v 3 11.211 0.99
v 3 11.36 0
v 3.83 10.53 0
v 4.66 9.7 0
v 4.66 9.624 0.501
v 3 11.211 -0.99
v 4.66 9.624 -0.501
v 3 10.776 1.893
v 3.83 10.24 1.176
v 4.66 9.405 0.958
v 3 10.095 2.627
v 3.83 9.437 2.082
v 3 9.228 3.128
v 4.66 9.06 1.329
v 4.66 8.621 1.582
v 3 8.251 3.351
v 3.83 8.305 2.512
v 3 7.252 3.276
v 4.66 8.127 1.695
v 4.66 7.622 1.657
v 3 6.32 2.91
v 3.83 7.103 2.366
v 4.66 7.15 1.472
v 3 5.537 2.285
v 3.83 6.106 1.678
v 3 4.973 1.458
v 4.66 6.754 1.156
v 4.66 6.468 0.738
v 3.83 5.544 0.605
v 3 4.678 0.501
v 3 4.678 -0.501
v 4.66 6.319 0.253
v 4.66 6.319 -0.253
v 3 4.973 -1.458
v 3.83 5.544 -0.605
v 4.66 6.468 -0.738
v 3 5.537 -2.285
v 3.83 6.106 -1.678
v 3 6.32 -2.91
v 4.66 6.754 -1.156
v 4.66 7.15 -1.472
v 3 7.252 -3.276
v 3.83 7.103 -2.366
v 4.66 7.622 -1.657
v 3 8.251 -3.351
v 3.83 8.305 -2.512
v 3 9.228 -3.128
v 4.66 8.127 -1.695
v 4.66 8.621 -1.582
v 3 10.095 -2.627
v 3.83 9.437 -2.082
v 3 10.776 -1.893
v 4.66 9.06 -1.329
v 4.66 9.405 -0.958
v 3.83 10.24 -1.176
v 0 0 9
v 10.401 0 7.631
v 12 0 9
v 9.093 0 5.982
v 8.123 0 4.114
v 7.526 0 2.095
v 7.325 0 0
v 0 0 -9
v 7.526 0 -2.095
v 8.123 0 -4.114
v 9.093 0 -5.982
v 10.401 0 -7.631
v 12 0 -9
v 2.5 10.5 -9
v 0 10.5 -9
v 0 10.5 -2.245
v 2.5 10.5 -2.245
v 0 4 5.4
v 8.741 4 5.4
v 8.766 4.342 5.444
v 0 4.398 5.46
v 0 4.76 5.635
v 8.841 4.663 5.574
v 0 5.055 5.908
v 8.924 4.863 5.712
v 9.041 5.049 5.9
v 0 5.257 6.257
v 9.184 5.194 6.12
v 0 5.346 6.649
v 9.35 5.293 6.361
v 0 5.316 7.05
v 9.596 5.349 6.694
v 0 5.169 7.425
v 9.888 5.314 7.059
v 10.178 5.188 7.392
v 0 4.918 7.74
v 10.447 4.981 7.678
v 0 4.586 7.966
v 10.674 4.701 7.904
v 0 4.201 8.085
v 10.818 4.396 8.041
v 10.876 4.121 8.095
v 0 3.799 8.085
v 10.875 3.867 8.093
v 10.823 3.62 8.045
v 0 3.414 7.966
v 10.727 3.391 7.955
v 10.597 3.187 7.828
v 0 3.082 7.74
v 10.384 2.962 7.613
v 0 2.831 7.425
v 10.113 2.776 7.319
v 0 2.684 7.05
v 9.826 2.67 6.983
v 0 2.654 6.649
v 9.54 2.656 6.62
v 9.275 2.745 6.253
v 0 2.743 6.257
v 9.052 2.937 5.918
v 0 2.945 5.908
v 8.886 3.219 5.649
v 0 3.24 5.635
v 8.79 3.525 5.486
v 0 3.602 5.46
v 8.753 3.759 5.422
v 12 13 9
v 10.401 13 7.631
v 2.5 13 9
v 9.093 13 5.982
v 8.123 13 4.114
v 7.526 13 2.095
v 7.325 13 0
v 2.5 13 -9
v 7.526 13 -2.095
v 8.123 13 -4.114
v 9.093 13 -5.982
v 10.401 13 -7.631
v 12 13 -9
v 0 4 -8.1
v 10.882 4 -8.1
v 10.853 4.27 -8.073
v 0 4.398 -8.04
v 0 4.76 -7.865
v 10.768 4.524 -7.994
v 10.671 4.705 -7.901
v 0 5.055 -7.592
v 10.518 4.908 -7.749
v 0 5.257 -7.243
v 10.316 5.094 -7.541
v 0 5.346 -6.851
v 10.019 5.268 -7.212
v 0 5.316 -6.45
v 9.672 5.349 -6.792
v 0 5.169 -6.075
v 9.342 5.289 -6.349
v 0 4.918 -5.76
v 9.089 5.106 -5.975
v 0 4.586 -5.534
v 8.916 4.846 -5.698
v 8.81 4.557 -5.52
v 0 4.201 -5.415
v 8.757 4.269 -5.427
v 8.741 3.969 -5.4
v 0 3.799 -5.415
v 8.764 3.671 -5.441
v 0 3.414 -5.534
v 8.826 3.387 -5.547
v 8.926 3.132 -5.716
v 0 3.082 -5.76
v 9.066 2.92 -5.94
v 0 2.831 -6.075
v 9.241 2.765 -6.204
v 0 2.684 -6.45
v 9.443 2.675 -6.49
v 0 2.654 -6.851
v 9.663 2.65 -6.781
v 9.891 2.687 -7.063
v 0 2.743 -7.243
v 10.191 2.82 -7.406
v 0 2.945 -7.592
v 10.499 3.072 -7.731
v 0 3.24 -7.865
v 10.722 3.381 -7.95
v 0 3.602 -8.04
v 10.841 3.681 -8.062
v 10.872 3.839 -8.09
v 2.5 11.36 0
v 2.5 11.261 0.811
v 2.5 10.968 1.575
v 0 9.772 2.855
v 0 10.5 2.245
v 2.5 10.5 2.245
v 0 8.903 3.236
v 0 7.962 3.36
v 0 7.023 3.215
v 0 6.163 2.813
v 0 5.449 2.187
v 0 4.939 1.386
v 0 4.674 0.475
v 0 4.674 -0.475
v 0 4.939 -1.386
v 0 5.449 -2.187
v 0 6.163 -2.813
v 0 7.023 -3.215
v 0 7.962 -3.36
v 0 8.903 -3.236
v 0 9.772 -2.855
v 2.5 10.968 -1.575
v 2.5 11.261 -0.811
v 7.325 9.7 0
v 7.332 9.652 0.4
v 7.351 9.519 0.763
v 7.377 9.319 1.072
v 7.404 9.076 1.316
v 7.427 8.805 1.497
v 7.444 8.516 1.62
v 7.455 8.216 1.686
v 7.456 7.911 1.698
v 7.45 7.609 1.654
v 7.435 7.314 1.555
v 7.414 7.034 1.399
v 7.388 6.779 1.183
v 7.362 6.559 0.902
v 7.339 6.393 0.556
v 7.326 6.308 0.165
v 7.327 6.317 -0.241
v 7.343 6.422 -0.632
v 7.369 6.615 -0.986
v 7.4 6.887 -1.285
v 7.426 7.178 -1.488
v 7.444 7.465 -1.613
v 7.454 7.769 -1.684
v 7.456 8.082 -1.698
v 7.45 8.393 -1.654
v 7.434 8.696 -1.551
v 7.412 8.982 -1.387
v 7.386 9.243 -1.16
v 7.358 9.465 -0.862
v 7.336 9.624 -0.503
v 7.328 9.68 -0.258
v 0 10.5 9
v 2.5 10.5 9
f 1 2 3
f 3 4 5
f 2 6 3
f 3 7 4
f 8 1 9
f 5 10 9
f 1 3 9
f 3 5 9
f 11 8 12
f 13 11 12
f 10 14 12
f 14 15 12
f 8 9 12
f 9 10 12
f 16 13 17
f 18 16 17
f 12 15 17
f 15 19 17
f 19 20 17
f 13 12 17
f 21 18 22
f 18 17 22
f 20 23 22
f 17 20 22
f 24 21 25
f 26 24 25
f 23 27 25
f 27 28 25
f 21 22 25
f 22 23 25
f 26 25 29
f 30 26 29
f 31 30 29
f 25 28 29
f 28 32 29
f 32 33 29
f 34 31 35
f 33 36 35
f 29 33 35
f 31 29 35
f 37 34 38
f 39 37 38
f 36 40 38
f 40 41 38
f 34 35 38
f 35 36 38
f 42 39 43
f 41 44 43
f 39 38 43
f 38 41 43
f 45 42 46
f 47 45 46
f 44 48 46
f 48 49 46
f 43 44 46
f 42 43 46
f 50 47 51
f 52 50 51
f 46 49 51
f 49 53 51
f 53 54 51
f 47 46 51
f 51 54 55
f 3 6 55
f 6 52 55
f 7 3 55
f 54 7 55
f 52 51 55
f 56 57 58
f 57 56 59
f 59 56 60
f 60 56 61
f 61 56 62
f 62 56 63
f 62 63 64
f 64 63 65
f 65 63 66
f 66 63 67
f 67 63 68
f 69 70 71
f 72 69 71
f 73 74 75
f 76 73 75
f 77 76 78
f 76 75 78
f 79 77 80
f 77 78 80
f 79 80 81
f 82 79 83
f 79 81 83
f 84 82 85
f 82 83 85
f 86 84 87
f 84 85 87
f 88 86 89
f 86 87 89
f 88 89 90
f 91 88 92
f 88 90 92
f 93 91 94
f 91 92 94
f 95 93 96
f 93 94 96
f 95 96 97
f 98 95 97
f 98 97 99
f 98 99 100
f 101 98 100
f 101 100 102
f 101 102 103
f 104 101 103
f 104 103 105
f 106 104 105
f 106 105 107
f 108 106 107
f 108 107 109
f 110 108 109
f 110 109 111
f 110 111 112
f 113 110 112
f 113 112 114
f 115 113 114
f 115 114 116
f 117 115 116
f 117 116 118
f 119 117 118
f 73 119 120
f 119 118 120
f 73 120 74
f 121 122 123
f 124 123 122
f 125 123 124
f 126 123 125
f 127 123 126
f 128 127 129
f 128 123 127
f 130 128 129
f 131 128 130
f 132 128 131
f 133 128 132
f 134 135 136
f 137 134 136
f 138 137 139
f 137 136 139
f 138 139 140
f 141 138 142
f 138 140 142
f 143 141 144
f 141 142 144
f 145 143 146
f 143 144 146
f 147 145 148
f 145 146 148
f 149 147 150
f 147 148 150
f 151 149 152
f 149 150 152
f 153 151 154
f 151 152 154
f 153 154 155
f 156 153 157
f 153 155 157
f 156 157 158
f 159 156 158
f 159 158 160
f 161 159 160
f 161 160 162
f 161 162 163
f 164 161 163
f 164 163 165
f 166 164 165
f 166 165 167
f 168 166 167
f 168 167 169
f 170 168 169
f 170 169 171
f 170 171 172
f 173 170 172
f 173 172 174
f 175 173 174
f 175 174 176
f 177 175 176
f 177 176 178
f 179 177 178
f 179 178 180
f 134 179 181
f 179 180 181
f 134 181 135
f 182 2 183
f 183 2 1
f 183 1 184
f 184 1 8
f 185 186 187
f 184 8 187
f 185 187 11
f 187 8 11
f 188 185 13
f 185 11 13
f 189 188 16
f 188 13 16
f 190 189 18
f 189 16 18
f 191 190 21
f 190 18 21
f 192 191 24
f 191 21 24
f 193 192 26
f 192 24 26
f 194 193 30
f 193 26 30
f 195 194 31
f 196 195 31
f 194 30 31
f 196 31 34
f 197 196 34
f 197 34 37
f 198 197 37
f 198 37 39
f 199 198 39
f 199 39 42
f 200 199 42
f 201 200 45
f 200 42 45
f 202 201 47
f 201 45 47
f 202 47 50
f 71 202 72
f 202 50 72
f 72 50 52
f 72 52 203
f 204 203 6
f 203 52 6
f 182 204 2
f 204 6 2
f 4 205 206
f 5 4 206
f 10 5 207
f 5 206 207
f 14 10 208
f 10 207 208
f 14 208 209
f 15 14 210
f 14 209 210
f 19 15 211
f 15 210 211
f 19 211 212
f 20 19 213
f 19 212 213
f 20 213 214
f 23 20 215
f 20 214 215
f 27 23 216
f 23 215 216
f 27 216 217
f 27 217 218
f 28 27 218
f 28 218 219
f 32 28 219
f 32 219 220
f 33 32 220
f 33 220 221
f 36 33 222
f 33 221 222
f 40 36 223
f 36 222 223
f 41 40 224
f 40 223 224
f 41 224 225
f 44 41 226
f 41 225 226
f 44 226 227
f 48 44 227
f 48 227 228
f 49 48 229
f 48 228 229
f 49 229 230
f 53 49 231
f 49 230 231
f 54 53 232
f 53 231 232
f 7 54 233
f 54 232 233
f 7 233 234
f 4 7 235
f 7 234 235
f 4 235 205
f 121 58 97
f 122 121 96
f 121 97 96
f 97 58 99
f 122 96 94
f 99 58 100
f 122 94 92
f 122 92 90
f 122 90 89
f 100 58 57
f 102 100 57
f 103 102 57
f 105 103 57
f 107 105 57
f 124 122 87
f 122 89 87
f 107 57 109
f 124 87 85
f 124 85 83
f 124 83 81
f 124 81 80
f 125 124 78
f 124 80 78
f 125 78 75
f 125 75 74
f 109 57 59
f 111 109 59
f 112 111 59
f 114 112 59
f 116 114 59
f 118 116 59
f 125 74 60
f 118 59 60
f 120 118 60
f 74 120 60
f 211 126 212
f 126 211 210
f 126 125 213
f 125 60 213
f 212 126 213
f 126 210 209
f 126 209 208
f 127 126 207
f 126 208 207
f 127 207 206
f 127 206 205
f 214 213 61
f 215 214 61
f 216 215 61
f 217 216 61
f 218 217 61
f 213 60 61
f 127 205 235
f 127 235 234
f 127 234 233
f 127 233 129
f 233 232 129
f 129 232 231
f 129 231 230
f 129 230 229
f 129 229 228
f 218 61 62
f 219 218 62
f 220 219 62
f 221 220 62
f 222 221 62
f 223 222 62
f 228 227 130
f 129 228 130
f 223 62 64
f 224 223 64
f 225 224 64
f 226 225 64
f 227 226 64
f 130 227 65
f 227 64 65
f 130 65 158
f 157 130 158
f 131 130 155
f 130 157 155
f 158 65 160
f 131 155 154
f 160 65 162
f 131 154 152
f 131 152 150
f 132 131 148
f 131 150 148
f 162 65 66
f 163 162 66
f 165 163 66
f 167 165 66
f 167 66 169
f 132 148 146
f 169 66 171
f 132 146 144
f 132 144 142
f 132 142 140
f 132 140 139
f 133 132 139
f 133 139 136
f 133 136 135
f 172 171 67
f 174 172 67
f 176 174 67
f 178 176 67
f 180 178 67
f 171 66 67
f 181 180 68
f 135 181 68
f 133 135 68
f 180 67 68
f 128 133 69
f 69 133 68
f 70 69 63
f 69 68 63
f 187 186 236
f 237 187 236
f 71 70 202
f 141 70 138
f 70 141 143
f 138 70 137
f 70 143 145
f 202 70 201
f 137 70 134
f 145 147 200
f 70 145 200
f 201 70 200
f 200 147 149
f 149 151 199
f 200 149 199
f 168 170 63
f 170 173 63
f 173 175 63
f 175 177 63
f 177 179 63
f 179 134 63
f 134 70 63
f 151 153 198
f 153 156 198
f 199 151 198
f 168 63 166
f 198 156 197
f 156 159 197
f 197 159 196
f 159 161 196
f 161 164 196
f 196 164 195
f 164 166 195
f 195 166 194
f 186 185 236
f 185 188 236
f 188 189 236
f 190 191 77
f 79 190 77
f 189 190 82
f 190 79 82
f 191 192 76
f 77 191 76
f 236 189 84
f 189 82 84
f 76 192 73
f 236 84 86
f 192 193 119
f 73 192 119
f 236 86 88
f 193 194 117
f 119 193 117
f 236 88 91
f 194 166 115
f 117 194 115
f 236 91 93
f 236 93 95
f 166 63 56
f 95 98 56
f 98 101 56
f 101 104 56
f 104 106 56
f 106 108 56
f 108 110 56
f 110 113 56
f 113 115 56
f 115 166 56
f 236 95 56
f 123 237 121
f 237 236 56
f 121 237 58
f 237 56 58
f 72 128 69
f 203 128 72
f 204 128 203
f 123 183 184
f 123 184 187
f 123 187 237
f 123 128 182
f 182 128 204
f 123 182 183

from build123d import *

# Parameters (mm, degrees)
BOSS_EXTRUDE1_DEPTH        = 13
F_2_7_2_7_DIAMETER_HOLE1_D = 2.7
SKETCH15_W                 = 18
SKETCH15_H                 = 2.5
CUT_EXTRUDE1_DEPTH         = 2.5


# Read off the part's stored shape, not the designer's step: CSK for M3 SFHCS1
with BuildPart() as part:
    # Sketch1 → Boss-Extrude1 (new body)
    with BuildSketch(Plane(origin=(0, 0, 0), x_dir=(1, 0, 0), z_dir=(0, 1, 0))):
        with BuildLine():
            Line((0, 9), (0, -9))
            Line((0, -9), (12, -9))
            ThreePointArc((12, -9), (7.32455532, 0), (12, 9))
            Line((12, 9), (0, 9))
        make_face()
    extrude(amount=BOSS_EXTRUDE1_DEPTH)

    # CSK for M3 SFHCS1 outline → CSK for M3 SFHCS1 (revolve, cut)
    with BuildSketch(Plane(origin=(0, 8, 0), x_dir=(0, 1, 0), z_dir=(0, 0, -1))):
        Polygon((1.7, 4.66), (1.7, 7.456784973), (0, 7.456784973), (0, 0), (3.36, 0), (3.36, 3), align=None)
    revolve(axis=Axis((0, 8, 0), (1, 0, 0)), mode=Mode.SUBTRACT)

    # Ø2.7 (2.7) Diameter Hole1 (through all)
    with Locations(Plane.ZY):
        with Locations((-6.75, 4), (6.75, 4)):
            Hole(F_2_7_2_7_DIAMETER_HOLE1_D / 2)

    # Sketch15 → Cut-Extrude1 (cut)
    with BuildSketch(Plane.ZY):
        with Locations((0, 11.75)):
            Rectangle(SKETCH15_W, SKETCH15_H)
    extrude(amount=-CUT_EXTRUDE1_DEPTH, mode=Mode.SUBTRACT)


solid = part.part
